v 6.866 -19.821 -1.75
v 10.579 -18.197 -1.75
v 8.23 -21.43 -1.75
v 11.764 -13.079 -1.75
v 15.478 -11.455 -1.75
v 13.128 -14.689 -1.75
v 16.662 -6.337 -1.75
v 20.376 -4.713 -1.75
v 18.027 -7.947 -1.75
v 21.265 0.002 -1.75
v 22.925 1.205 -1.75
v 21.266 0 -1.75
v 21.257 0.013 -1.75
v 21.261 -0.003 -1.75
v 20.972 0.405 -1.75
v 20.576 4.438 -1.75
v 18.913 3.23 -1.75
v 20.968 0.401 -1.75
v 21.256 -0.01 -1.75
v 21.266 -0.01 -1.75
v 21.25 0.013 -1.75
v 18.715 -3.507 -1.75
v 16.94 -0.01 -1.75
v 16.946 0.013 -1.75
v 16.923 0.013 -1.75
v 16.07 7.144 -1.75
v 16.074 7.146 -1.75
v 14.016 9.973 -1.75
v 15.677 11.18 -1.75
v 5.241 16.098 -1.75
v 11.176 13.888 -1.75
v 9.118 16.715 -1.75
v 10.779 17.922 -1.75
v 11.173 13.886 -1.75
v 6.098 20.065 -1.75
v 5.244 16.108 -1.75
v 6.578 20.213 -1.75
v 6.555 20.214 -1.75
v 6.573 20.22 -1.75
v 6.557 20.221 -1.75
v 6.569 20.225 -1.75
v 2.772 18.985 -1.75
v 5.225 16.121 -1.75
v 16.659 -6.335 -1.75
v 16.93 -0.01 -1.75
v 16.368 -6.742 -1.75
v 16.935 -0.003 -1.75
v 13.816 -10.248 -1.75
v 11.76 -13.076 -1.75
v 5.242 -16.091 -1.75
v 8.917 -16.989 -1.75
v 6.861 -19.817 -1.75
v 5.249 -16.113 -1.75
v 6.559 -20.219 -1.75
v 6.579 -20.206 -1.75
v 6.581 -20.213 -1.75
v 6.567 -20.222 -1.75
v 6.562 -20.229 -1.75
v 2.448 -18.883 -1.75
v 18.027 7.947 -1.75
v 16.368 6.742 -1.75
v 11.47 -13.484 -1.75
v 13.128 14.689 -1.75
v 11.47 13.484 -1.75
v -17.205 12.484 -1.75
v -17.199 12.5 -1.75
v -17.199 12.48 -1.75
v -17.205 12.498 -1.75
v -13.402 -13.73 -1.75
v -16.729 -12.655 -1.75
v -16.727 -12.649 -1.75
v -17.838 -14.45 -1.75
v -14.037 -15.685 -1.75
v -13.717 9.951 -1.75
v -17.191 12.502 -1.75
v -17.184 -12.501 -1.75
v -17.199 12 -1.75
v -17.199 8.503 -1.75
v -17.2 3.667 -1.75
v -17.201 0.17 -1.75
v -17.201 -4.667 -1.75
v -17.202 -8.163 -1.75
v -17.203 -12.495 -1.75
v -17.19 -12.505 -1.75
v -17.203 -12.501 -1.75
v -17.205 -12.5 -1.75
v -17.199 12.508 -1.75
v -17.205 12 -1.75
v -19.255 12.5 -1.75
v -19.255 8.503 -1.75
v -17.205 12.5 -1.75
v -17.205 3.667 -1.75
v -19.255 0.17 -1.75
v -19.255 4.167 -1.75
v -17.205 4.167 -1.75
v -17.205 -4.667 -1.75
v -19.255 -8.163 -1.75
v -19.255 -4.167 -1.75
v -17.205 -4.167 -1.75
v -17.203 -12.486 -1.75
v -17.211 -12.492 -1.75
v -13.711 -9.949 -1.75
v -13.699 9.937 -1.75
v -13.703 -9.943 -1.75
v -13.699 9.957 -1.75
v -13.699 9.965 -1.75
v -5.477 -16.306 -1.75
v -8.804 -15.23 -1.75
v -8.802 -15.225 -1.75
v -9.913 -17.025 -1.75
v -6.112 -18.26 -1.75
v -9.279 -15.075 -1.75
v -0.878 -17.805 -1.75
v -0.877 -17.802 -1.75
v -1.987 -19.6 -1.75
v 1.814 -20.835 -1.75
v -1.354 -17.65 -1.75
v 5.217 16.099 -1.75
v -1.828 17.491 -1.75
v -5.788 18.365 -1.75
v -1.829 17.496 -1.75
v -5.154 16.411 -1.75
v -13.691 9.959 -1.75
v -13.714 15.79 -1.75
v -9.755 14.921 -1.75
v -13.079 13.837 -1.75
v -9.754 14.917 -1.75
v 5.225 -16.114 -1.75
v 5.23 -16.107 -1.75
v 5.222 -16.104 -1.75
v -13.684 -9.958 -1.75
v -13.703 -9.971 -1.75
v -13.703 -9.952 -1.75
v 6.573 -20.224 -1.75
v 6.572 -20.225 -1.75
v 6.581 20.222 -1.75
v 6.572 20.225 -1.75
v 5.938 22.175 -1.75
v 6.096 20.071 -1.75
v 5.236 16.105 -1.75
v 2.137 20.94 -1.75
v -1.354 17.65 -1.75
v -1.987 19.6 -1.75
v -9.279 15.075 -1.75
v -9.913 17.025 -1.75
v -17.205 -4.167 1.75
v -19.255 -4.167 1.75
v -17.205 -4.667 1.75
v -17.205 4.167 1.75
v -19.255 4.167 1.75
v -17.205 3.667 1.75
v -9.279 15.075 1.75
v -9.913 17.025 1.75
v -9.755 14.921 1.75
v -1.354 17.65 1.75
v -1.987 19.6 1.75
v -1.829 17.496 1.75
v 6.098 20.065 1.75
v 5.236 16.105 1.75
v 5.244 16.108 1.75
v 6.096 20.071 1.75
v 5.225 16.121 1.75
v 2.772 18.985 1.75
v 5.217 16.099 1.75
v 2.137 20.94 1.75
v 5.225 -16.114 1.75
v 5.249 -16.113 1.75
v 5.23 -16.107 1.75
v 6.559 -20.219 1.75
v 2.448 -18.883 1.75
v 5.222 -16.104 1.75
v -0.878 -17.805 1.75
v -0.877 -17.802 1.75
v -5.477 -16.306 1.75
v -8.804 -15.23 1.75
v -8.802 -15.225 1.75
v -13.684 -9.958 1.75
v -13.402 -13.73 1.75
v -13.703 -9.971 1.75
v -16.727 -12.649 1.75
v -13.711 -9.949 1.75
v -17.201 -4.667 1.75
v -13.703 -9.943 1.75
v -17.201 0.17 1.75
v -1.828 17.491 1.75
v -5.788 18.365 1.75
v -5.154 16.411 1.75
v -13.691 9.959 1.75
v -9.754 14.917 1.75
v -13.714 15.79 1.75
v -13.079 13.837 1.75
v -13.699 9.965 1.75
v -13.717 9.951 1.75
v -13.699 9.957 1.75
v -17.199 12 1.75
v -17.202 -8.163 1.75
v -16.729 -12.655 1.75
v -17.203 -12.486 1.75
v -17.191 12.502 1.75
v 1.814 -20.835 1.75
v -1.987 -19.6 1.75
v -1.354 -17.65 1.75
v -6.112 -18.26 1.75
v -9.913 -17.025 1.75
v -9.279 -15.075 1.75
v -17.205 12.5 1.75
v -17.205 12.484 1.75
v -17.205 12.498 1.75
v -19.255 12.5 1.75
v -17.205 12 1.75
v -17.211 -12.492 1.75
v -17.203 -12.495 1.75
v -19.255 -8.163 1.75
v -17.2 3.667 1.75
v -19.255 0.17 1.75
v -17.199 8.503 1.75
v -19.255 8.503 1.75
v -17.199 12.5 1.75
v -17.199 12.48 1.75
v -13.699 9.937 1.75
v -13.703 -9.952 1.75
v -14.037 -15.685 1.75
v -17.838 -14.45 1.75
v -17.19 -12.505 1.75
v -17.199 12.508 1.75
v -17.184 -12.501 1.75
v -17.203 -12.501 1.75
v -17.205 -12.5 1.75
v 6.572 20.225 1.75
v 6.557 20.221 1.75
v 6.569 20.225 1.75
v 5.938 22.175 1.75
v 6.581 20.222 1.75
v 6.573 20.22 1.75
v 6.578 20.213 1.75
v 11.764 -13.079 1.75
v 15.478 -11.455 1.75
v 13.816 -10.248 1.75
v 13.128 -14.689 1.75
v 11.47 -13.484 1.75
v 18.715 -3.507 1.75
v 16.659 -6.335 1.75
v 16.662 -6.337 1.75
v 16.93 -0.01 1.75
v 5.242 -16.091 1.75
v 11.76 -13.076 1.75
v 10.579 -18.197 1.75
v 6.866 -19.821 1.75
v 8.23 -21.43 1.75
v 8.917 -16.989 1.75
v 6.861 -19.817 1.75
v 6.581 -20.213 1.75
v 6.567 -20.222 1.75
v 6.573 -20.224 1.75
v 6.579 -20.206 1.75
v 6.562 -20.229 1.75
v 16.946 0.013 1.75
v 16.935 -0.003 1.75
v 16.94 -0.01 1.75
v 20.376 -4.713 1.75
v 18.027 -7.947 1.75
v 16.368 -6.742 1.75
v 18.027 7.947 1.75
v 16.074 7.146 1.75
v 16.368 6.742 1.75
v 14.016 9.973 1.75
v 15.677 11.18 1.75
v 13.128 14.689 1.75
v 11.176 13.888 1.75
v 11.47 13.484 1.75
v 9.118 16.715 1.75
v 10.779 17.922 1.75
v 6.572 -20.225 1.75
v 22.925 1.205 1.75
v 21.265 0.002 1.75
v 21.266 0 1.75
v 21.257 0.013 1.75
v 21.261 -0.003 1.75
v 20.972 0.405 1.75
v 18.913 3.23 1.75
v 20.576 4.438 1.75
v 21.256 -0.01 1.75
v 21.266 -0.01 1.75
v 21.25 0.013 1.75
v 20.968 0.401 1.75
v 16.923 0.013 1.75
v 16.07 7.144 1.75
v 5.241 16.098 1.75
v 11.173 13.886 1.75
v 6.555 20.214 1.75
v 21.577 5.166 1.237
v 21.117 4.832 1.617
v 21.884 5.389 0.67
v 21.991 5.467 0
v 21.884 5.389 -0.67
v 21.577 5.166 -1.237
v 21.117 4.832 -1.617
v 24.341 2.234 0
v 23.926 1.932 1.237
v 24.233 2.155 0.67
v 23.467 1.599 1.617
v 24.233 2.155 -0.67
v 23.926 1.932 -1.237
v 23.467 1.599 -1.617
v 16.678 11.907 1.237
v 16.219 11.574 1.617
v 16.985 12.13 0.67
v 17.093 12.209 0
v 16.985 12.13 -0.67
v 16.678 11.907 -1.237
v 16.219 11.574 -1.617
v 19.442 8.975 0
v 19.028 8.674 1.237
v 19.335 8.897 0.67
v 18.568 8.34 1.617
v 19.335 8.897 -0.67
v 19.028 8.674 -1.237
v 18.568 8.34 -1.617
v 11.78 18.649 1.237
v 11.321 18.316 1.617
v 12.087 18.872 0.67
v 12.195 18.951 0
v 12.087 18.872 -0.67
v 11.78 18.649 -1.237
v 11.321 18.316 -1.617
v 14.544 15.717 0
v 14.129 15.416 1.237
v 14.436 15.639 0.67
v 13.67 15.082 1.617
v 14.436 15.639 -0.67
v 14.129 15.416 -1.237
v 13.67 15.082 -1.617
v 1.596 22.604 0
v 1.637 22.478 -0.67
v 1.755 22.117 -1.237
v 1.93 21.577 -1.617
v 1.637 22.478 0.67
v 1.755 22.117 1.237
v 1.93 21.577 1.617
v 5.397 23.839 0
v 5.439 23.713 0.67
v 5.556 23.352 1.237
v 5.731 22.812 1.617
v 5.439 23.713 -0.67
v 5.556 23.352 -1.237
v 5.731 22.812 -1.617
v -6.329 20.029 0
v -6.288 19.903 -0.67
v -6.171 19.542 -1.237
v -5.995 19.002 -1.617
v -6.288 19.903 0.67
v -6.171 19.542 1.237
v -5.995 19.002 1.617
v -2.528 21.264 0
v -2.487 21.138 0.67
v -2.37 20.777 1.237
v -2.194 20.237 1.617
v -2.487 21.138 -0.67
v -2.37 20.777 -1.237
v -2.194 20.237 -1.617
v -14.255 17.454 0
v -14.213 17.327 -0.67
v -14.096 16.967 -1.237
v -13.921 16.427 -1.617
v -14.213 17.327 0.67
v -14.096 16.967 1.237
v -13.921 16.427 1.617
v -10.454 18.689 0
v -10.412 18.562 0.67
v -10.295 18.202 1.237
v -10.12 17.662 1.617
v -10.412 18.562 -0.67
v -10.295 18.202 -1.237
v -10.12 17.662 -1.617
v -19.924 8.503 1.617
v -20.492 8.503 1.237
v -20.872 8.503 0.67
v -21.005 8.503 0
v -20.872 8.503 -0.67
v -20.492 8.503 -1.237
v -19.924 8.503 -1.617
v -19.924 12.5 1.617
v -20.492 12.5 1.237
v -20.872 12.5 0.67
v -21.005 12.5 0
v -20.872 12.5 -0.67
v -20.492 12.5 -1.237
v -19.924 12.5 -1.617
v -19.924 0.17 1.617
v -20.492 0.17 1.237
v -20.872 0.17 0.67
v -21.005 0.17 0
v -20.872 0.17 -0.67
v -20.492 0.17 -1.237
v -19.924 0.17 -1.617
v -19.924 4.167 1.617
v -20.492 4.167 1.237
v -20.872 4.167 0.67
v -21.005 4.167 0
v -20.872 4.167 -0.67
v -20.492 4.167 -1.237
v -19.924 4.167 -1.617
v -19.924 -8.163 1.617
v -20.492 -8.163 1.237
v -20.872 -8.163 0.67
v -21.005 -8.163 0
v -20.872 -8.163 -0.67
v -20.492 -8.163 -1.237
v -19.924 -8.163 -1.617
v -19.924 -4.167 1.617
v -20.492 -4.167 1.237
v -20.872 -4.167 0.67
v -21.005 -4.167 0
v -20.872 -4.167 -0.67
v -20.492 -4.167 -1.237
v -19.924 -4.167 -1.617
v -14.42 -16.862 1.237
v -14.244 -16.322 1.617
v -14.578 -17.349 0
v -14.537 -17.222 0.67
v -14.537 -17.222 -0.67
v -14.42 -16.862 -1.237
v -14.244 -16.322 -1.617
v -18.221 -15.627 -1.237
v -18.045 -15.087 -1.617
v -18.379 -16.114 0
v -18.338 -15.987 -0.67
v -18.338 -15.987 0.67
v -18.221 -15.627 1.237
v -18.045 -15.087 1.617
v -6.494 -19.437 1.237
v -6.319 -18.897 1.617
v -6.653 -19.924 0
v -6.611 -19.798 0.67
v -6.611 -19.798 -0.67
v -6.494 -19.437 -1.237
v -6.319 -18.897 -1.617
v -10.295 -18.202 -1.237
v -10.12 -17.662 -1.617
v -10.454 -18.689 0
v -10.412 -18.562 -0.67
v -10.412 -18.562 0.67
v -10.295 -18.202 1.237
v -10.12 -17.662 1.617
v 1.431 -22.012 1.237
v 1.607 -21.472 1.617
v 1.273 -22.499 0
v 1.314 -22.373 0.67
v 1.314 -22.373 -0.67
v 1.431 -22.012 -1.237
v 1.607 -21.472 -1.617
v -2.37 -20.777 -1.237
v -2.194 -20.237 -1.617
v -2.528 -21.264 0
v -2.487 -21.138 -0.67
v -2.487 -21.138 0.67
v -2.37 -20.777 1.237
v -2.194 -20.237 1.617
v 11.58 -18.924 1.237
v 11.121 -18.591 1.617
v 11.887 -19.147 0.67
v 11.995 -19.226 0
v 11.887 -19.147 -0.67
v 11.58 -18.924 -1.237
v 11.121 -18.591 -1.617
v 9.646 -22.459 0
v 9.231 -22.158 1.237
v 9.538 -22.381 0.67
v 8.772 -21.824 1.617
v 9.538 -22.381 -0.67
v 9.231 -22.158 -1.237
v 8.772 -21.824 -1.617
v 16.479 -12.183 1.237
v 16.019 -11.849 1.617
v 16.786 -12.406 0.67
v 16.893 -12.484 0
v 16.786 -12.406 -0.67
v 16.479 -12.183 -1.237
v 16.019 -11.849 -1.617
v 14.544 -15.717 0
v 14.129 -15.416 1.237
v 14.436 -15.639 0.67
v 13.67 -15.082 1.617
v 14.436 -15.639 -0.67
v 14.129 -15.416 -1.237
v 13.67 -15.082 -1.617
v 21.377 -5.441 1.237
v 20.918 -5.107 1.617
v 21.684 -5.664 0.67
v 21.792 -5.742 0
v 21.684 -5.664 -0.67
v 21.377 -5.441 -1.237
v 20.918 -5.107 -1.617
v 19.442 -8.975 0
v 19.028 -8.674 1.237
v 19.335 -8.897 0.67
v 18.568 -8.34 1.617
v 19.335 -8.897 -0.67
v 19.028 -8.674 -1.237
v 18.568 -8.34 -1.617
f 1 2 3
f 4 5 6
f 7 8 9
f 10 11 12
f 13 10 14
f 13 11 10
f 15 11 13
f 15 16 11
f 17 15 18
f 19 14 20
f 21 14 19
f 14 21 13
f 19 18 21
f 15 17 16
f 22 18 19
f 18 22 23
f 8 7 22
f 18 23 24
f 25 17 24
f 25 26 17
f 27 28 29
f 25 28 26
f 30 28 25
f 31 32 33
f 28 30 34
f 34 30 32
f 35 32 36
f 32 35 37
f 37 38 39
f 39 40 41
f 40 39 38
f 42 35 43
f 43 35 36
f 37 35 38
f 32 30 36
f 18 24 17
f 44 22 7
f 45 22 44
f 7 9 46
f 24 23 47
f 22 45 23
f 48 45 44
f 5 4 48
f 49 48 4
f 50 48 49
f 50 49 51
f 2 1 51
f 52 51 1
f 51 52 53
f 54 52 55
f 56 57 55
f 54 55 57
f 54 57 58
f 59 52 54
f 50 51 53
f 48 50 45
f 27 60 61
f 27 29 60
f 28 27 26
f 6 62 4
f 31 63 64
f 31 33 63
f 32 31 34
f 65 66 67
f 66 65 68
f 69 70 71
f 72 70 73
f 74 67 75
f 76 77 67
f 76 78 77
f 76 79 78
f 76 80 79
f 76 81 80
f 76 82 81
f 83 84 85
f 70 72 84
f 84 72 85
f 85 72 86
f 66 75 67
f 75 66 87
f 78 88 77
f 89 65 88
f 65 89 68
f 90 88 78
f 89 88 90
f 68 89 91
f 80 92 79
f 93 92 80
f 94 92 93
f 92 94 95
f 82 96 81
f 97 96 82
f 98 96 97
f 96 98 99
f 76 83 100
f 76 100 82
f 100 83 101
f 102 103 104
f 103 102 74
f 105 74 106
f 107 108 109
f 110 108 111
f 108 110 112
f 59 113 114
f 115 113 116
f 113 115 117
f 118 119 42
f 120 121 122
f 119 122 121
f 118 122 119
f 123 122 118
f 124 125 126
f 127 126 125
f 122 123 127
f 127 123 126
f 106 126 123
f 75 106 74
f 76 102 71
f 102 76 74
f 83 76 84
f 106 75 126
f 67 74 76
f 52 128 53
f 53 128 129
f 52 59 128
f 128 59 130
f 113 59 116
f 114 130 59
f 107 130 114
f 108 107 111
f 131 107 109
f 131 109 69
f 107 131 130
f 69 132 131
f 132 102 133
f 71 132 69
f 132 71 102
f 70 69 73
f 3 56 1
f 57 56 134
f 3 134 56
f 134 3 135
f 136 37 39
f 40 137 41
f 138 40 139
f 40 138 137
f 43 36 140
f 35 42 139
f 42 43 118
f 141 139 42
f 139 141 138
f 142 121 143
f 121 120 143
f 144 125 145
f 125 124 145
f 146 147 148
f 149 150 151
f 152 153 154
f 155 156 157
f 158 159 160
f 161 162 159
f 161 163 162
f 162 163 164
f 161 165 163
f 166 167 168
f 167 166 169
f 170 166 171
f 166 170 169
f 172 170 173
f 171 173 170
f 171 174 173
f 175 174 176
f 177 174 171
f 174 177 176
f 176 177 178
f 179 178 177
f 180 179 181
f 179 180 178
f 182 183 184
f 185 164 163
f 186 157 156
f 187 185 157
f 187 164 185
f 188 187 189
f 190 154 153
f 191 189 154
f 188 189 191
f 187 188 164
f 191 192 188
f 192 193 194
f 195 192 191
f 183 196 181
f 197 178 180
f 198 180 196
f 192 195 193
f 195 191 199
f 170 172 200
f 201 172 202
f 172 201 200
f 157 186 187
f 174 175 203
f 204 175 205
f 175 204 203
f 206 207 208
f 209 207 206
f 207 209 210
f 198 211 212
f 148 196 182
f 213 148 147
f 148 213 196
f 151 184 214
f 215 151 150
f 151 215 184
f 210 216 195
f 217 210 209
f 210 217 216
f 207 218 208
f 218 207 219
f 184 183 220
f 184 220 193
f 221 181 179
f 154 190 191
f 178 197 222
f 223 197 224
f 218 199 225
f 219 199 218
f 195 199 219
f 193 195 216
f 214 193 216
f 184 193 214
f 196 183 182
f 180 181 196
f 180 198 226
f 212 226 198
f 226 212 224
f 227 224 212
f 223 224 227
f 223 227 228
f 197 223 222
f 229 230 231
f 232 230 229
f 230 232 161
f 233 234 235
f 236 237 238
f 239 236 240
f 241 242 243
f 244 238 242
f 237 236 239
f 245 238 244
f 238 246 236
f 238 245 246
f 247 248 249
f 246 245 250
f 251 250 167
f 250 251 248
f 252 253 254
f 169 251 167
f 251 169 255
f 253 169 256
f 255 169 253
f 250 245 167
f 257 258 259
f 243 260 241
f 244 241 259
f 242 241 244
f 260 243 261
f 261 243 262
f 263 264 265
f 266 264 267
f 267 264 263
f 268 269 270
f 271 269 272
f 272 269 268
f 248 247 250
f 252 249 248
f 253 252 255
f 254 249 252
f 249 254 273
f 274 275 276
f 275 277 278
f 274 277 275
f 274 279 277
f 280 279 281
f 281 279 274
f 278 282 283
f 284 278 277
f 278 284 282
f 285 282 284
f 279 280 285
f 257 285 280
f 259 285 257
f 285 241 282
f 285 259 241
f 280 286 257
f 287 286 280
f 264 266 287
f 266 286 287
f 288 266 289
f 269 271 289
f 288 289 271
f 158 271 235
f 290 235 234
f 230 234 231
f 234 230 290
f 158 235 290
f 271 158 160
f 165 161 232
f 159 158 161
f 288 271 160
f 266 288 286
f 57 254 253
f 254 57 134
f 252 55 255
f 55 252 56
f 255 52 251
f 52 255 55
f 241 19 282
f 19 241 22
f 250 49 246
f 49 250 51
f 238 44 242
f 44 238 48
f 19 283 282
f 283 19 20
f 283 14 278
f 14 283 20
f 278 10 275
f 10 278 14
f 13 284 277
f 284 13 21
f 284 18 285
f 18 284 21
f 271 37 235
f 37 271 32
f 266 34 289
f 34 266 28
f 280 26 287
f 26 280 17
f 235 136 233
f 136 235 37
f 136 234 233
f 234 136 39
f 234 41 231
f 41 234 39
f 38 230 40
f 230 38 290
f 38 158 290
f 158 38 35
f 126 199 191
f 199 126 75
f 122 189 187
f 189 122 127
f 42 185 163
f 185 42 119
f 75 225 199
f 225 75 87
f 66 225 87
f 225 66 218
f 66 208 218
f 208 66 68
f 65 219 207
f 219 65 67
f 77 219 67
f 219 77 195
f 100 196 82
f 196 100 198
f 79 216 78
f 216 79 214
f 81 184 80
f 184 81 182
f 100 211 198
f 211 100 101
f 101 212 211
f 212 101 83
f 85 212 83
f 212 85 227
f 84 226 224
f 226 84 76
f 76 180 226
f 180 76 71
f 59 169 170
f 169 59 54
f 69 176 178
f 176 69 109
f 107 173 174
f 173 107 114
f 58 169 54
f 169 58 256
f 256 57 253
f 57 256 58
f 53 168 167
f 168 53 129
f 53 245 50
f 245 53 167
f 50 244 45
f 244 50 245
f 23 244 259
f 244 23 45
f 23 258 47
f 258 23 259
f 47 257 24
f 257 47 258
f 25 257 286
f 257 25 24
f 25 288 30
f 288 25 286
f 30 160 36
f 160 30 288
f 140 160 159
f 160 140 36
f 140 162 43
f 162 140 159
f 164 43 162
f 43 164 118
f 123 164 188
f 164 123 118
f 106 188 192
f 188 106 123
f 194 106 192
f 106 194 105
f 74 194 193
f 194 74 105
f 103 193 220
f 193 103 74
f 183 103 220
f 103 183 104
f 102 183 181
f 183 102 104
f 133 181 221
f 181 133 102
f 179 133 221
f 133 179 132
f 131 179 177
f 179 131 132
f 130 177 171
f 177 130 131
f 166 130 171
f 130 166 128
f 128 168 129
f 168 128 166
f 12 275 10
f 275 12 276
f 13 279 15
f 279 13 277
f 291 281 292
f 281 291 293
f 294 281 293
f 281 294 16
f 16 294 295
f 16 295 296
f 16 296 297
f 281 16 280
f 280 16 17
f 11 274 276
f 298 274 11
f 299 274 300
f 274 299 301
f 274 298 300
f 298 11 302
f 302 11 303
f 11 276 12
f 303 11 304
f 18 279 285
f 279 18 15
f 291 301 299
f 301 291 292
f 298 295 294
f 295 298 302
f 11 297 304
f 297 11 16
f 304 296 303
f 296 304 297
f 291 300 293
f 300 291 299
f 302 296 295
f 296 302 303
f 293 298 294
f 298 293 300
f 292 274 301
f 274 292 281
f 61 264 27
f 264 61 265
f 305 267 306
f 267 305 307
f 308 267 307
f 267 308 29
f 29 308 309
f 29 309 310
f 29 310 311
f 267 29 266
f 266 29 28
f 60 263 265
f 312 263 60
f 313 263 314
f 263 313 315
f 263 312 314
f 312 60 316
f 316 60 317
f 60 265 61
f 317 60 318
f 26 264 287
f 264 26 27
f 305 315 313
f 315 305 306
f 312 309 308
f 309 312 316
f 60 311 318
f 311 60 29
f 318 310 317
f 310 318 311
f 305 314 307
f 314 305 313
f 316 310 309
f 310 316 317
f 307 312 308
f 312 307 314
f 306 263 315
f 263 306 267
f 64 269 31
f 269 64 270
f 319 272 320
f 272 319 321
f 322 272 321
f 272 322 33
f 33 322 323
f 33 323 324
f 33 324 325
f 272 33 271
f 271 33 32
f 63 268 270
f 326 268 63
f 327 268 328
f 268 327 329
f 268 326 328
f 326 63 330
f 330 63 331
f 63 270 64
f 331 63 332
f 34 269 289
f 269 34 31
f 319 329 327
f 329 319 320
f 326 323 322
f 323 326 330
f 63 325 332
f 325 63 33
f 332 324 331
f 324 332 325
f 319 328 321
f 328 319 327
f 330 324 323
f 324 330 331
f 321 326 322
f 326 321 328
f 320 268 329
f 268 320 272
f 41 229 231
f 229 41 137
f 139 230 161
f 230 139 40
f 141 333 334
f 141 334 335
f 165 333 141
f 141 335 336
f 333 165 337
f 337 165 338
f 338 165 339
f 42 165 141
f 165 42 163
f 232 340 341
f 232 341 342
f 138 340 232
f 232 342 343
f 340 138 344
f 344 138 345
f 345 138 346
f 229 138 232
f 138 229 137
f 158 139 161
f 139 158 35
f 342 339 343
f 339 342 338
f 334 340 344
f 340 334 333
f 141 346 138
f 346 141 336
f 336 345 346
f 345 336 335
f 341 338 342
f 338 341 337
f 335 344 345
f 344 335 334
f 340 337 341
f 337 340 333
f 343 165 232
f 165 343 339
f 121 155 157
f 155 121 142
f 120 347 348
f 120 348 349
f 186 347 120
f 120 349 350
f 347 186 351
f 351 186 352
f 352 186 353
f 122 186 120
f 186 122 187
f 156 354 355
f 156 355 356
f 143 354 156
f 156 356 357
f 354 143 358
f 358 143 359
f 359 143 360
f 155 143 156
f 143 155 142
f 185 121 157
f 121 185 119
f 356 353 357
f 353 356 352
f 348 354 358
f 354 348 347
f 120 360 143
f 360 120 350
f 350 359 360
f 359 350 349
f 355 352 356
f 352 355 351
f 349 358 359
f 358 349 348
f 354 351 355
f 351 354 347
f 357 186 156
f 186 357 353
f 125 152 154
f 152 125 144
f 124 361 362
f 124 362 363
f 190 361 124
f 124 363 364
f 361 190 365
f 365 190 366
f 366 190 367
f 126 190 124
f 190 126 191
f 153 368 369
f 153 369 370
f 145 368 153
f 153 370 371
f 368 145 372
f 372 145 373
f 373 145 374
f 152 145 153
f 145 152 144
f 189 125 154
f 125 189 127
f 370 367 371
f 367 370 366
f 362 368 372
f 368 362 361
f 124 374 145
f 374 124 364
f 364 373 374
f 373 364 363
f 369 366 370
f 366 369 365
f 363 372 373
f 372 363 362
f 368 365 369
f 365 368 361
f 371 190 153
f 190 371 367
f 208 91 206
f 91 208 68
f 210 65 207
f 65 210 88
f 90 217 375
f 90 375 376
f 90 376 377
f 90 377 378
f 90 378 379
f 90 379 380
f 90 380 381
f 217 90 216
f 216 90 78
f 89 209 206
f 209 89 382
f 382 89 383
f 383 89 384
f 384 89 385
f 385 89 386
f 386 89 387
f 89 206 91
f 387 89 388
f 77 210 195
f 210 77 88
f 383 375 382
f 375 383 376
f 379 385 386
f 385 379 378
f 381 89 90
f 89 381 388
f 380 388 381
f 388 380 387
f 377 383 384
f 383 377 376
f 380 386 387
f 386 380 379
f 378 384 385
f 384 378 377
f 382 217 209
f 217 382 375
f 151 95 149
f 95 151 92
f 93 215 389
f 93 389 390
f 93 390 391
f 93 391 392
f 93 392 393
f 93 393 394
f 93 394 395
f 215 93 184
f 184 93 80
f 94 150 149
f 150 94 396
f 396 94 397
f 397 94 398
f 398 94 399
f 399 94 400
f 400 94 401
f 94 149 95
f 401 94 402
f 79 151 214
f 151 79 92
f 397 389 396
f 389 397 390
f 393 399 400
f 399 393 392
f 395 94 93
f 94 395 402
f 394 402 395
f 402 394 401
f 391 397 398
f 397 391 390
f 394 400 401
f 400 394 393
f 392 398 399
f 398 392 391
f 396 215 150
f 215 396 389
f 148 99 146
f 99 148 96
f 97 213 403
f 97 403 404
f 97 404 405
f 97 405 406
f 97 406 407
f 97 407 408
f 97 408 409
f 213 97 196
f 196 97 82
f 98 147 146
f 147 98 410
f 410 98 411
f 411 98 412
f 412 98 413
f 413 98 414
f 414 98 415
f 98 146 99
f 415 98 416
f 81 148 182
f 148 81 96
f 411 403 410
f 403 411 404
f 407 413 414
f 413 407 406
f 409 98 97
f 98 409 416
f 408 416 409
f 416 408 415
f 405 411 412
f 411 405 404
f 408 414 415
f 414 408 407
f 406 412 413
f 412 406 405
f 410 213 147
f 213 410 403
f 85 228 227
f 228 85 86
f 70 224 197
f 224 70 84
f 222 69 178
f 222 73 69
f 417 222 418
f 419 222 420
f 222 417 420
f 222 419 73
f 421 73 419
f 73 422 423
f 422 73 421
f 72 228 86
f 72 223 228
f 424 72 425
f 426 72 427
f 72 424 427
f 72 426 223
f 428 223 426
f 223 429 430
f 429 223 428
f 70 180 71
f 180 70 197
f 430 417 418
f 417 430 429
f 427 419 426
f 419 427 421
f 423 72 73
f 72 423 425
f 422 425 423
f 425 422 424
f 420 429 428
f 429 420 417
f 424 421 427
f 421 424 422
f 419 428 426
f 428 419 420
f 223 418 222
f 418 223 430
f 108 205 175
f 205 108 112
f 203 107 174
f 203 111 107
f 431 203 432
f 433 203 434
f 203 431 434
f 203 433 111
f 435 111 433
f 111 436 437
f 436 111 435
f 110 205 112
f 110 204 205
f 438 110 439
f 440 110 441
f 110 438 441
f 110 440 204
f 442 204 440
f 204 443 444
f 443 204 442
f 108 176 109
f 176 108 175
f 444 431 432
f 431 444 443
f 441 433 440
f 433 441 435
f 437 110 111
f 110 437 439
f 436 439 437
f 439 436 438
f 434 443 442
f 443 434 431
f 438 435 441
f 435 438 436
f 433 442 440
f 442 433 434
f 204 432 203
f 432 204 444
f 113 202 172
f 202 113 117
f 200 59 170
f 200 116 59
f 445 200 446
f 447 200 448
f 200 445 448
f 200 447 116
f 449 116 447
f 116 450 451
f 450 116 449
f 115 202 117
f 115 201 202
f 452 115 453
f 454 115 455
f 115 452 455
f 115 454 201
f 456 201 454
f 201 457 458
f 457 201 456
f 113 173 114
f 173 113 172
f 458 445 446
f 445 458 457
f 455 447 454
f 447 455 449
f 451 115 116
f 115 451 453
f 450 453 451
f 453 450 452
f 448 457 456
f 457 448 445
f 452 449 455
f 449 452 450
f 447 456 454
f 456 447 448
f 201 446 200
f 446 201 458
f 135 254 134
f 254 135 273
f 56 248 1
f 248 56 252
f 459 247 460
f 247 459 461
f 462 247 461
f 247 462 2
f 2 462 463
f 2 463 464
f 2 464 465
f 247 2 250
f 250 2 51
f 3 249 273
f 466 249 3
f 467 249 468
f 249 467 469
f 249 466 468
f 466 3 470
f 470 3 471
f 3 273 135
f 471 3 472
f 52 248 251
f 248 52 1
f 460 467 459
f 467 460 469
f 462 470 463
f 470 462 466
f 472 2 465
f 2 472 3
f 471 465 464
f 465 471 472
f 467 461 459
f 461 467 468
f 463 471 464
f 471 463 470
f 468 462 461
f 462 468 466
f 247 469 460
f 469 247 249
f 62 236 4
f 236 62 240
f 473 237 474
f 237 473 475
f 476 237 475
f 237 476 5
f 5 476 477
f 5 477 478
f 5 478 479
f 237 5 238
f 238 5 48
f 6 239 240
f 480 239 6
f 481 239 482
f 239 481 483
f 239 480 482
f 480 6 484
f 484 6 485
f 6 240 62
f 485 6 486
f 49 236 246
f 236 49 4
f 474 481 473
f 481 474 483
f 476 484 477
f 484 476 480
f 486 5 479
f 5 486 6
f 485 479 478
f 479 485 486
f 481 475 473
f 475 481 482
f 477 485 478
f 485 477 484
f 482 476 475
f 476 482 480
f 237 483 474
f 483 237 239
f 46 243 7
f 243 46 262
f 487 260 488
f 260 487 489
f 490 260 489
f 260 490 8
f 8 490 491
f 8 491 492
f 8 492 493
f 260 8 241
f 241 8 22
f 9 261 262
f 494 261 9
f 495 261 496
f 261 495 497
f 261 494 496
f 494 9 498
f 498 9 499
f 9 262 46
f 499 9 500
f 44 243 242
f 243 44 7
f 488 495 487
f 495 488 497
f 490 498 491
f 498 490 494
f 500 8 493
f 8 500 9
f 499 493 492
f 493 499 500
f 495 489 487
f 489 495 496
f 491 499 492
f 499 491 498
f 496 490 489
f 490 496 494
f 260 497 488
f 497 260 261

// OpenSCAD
// [FL_INDEX: keywords="openscad, 3d_parametric, Poly-Snaps__Tiles_for_Building_Polyhedra, csg_solid" | COT="Parametric OpenSCAD design from 3DCodeverse"]
// Title: Poly-Snaps: Tiles for Building Polyhedra

// mathgrrl polysnap tiles

// AS SUBMITTED TO THINGIVERSE CUSTOMIZER - DO NOT MODIFY THIS COPY

//////////////////////////////////////////////////////////////////////////
// PARAMETERS ////////////////////////////////////////////////////////////

/* [Shape] */

// Choose the number of sides for the tile
sides = 5; // [3,4,5,6,7,8,9,10,11,12]

// Choose the number of snaps on each side
snaps = 3; // [2,3,4,5,6,7,8]

/* [Size] */

// Set the length of each side, in mm
side_length = 25; 

// Set the thickness of the tile, in mm
thickness = 3.5;

// Set the border thickness, in mm
border = 3.5;	

/* [Adjust Fit] */

// Add extra space between snaps, in mm
clearance = .17;

// Add extra length to the snaps, in mm
lengthen = .3;

//radius depends on side length
radius = side_length/(2*sin(180/sides)); 

//inside radius depends on the border thickness
inside = radius-border/(cos(180/sides)); 

//width of each snap depends on number of snaps	
snapwidth = radius*sin(180/sides)/snaps;

//////////////////////////////////////////////////////////////////////////
// RENDERS ///////////////////////////////////////////////////////////////

union(){
	//make the polygon base
	poly_maker(); 									
	
	//make the snaps
	snap_maker();	
}

//////////////////////////////////////////////////////////////////////////
// MODULES ///////////////////////////////////////////////////////////////

//build the polygon shape of the tile
//shape is made up of n=sides wedges that are rotated around
module poly_maker(){

	//subtract the smaller polygon from the larger polygon
	difference(){

		//extrude to thicken the polygon
		linear_extrude(height=thickness,center=true){ 

			//rotate the wedge n=sides times at angle of 360/n each time
			for(i=[0:sides]){

				//rotation is around the z-axis [0,0,1]
				rotate(i*360/sides,[0,0,1])	

					//make triangular wedge with angle based on number of sides
					polygon(

						//the three vertices of the triangle
						points =	[[0-.1,0-.1], //tweaks fix CGAL errors
									 [radius,0-.01],
									 [radius*cos(360/sides)-.01,radius*sin(360/sides)+.01]],

						//the order to connect the three vertices above
						paths = [[0,1,2]]
					);
			}
		}
		//extrude to thicken the center polygon that will be the hole
		linear_extrude(height=thickness+2,center=true){ 

			//rotate the wedge n=sides times at angle of 360/n each time			
			for(i=[0:sides]){

				//rotation is around the z-axis [0,0,1]
				rotate(i*360/sides,[0,0,1])	

					//make triangular wedge with angle based on number of sides
					polygon(

						//the three vertices of the triangle
						points =	[[0-.2,0-.2], //tweaks fix CGAL errors
									 [inside,0-.01],
									 [inside*cos(360/sides)-.01,inside*sin(360/sides)+.01]],

						//the order to connect the three vertices above
						paths = [[0,1,2]]
					);
			}
		}
	}
}

//build the snaps around the tile
//try the commands alone with i=1 and i=2 to see how this works
//remember to read from the bottom to the top to make sense of this
module snap_maker(){

	//rotate the side of snaps n=sides times at angle of 360/n each time
	for(i=[0:sides]){ 

		//rotation is around the z-axis [0,0,1]
		rotate(i*360/sides,[0,0,1]) 	

			//build snaps for first side at the origin and move into positions
			for(i=[0:snaps-1]){	

				//read the rest of the commands from bottom to top
				//translate the snap to the first side
				translate([radius,0,-thickness/2]) 

					//rotate the snap to correct angle for first side
					rotate(180/sides) 

						//for i^th snap translate 2*i snapwidths over from origin
						translate([0,2*i*snapwidth,0]) 

							//rounded box for snap made from a box and cylinder
							union(){

								//cube part of snap shape at the origin
								cube([thickness/2+lengthen,snapwidth-clearance,thickness]);

								//post at back of snap to avoid loose teeth
								//shifted a bit right to avoid overhangs when sides=3
								translate([-.5,.5,0])
									cube([thickness/2,snapwidth-clearance-.5,thickness]);
	
								//round part of snap shape at the origin
								//move cylinder to the end of the box
								translate([thickness/2+lengthen,snapwidth-clearance,thickness/2])

									//rotate cylinder to match box orientation
									rotate(90,[0,1,0]) 
										rotate(90,[1,0,0]) 

											//cylinder of the correct size to match box
											cylinder(	
												r=thickness/2,
												h=snapwidth-clearance,
												$fn=16  //number of sides
											);
							}
			}
	}
}
